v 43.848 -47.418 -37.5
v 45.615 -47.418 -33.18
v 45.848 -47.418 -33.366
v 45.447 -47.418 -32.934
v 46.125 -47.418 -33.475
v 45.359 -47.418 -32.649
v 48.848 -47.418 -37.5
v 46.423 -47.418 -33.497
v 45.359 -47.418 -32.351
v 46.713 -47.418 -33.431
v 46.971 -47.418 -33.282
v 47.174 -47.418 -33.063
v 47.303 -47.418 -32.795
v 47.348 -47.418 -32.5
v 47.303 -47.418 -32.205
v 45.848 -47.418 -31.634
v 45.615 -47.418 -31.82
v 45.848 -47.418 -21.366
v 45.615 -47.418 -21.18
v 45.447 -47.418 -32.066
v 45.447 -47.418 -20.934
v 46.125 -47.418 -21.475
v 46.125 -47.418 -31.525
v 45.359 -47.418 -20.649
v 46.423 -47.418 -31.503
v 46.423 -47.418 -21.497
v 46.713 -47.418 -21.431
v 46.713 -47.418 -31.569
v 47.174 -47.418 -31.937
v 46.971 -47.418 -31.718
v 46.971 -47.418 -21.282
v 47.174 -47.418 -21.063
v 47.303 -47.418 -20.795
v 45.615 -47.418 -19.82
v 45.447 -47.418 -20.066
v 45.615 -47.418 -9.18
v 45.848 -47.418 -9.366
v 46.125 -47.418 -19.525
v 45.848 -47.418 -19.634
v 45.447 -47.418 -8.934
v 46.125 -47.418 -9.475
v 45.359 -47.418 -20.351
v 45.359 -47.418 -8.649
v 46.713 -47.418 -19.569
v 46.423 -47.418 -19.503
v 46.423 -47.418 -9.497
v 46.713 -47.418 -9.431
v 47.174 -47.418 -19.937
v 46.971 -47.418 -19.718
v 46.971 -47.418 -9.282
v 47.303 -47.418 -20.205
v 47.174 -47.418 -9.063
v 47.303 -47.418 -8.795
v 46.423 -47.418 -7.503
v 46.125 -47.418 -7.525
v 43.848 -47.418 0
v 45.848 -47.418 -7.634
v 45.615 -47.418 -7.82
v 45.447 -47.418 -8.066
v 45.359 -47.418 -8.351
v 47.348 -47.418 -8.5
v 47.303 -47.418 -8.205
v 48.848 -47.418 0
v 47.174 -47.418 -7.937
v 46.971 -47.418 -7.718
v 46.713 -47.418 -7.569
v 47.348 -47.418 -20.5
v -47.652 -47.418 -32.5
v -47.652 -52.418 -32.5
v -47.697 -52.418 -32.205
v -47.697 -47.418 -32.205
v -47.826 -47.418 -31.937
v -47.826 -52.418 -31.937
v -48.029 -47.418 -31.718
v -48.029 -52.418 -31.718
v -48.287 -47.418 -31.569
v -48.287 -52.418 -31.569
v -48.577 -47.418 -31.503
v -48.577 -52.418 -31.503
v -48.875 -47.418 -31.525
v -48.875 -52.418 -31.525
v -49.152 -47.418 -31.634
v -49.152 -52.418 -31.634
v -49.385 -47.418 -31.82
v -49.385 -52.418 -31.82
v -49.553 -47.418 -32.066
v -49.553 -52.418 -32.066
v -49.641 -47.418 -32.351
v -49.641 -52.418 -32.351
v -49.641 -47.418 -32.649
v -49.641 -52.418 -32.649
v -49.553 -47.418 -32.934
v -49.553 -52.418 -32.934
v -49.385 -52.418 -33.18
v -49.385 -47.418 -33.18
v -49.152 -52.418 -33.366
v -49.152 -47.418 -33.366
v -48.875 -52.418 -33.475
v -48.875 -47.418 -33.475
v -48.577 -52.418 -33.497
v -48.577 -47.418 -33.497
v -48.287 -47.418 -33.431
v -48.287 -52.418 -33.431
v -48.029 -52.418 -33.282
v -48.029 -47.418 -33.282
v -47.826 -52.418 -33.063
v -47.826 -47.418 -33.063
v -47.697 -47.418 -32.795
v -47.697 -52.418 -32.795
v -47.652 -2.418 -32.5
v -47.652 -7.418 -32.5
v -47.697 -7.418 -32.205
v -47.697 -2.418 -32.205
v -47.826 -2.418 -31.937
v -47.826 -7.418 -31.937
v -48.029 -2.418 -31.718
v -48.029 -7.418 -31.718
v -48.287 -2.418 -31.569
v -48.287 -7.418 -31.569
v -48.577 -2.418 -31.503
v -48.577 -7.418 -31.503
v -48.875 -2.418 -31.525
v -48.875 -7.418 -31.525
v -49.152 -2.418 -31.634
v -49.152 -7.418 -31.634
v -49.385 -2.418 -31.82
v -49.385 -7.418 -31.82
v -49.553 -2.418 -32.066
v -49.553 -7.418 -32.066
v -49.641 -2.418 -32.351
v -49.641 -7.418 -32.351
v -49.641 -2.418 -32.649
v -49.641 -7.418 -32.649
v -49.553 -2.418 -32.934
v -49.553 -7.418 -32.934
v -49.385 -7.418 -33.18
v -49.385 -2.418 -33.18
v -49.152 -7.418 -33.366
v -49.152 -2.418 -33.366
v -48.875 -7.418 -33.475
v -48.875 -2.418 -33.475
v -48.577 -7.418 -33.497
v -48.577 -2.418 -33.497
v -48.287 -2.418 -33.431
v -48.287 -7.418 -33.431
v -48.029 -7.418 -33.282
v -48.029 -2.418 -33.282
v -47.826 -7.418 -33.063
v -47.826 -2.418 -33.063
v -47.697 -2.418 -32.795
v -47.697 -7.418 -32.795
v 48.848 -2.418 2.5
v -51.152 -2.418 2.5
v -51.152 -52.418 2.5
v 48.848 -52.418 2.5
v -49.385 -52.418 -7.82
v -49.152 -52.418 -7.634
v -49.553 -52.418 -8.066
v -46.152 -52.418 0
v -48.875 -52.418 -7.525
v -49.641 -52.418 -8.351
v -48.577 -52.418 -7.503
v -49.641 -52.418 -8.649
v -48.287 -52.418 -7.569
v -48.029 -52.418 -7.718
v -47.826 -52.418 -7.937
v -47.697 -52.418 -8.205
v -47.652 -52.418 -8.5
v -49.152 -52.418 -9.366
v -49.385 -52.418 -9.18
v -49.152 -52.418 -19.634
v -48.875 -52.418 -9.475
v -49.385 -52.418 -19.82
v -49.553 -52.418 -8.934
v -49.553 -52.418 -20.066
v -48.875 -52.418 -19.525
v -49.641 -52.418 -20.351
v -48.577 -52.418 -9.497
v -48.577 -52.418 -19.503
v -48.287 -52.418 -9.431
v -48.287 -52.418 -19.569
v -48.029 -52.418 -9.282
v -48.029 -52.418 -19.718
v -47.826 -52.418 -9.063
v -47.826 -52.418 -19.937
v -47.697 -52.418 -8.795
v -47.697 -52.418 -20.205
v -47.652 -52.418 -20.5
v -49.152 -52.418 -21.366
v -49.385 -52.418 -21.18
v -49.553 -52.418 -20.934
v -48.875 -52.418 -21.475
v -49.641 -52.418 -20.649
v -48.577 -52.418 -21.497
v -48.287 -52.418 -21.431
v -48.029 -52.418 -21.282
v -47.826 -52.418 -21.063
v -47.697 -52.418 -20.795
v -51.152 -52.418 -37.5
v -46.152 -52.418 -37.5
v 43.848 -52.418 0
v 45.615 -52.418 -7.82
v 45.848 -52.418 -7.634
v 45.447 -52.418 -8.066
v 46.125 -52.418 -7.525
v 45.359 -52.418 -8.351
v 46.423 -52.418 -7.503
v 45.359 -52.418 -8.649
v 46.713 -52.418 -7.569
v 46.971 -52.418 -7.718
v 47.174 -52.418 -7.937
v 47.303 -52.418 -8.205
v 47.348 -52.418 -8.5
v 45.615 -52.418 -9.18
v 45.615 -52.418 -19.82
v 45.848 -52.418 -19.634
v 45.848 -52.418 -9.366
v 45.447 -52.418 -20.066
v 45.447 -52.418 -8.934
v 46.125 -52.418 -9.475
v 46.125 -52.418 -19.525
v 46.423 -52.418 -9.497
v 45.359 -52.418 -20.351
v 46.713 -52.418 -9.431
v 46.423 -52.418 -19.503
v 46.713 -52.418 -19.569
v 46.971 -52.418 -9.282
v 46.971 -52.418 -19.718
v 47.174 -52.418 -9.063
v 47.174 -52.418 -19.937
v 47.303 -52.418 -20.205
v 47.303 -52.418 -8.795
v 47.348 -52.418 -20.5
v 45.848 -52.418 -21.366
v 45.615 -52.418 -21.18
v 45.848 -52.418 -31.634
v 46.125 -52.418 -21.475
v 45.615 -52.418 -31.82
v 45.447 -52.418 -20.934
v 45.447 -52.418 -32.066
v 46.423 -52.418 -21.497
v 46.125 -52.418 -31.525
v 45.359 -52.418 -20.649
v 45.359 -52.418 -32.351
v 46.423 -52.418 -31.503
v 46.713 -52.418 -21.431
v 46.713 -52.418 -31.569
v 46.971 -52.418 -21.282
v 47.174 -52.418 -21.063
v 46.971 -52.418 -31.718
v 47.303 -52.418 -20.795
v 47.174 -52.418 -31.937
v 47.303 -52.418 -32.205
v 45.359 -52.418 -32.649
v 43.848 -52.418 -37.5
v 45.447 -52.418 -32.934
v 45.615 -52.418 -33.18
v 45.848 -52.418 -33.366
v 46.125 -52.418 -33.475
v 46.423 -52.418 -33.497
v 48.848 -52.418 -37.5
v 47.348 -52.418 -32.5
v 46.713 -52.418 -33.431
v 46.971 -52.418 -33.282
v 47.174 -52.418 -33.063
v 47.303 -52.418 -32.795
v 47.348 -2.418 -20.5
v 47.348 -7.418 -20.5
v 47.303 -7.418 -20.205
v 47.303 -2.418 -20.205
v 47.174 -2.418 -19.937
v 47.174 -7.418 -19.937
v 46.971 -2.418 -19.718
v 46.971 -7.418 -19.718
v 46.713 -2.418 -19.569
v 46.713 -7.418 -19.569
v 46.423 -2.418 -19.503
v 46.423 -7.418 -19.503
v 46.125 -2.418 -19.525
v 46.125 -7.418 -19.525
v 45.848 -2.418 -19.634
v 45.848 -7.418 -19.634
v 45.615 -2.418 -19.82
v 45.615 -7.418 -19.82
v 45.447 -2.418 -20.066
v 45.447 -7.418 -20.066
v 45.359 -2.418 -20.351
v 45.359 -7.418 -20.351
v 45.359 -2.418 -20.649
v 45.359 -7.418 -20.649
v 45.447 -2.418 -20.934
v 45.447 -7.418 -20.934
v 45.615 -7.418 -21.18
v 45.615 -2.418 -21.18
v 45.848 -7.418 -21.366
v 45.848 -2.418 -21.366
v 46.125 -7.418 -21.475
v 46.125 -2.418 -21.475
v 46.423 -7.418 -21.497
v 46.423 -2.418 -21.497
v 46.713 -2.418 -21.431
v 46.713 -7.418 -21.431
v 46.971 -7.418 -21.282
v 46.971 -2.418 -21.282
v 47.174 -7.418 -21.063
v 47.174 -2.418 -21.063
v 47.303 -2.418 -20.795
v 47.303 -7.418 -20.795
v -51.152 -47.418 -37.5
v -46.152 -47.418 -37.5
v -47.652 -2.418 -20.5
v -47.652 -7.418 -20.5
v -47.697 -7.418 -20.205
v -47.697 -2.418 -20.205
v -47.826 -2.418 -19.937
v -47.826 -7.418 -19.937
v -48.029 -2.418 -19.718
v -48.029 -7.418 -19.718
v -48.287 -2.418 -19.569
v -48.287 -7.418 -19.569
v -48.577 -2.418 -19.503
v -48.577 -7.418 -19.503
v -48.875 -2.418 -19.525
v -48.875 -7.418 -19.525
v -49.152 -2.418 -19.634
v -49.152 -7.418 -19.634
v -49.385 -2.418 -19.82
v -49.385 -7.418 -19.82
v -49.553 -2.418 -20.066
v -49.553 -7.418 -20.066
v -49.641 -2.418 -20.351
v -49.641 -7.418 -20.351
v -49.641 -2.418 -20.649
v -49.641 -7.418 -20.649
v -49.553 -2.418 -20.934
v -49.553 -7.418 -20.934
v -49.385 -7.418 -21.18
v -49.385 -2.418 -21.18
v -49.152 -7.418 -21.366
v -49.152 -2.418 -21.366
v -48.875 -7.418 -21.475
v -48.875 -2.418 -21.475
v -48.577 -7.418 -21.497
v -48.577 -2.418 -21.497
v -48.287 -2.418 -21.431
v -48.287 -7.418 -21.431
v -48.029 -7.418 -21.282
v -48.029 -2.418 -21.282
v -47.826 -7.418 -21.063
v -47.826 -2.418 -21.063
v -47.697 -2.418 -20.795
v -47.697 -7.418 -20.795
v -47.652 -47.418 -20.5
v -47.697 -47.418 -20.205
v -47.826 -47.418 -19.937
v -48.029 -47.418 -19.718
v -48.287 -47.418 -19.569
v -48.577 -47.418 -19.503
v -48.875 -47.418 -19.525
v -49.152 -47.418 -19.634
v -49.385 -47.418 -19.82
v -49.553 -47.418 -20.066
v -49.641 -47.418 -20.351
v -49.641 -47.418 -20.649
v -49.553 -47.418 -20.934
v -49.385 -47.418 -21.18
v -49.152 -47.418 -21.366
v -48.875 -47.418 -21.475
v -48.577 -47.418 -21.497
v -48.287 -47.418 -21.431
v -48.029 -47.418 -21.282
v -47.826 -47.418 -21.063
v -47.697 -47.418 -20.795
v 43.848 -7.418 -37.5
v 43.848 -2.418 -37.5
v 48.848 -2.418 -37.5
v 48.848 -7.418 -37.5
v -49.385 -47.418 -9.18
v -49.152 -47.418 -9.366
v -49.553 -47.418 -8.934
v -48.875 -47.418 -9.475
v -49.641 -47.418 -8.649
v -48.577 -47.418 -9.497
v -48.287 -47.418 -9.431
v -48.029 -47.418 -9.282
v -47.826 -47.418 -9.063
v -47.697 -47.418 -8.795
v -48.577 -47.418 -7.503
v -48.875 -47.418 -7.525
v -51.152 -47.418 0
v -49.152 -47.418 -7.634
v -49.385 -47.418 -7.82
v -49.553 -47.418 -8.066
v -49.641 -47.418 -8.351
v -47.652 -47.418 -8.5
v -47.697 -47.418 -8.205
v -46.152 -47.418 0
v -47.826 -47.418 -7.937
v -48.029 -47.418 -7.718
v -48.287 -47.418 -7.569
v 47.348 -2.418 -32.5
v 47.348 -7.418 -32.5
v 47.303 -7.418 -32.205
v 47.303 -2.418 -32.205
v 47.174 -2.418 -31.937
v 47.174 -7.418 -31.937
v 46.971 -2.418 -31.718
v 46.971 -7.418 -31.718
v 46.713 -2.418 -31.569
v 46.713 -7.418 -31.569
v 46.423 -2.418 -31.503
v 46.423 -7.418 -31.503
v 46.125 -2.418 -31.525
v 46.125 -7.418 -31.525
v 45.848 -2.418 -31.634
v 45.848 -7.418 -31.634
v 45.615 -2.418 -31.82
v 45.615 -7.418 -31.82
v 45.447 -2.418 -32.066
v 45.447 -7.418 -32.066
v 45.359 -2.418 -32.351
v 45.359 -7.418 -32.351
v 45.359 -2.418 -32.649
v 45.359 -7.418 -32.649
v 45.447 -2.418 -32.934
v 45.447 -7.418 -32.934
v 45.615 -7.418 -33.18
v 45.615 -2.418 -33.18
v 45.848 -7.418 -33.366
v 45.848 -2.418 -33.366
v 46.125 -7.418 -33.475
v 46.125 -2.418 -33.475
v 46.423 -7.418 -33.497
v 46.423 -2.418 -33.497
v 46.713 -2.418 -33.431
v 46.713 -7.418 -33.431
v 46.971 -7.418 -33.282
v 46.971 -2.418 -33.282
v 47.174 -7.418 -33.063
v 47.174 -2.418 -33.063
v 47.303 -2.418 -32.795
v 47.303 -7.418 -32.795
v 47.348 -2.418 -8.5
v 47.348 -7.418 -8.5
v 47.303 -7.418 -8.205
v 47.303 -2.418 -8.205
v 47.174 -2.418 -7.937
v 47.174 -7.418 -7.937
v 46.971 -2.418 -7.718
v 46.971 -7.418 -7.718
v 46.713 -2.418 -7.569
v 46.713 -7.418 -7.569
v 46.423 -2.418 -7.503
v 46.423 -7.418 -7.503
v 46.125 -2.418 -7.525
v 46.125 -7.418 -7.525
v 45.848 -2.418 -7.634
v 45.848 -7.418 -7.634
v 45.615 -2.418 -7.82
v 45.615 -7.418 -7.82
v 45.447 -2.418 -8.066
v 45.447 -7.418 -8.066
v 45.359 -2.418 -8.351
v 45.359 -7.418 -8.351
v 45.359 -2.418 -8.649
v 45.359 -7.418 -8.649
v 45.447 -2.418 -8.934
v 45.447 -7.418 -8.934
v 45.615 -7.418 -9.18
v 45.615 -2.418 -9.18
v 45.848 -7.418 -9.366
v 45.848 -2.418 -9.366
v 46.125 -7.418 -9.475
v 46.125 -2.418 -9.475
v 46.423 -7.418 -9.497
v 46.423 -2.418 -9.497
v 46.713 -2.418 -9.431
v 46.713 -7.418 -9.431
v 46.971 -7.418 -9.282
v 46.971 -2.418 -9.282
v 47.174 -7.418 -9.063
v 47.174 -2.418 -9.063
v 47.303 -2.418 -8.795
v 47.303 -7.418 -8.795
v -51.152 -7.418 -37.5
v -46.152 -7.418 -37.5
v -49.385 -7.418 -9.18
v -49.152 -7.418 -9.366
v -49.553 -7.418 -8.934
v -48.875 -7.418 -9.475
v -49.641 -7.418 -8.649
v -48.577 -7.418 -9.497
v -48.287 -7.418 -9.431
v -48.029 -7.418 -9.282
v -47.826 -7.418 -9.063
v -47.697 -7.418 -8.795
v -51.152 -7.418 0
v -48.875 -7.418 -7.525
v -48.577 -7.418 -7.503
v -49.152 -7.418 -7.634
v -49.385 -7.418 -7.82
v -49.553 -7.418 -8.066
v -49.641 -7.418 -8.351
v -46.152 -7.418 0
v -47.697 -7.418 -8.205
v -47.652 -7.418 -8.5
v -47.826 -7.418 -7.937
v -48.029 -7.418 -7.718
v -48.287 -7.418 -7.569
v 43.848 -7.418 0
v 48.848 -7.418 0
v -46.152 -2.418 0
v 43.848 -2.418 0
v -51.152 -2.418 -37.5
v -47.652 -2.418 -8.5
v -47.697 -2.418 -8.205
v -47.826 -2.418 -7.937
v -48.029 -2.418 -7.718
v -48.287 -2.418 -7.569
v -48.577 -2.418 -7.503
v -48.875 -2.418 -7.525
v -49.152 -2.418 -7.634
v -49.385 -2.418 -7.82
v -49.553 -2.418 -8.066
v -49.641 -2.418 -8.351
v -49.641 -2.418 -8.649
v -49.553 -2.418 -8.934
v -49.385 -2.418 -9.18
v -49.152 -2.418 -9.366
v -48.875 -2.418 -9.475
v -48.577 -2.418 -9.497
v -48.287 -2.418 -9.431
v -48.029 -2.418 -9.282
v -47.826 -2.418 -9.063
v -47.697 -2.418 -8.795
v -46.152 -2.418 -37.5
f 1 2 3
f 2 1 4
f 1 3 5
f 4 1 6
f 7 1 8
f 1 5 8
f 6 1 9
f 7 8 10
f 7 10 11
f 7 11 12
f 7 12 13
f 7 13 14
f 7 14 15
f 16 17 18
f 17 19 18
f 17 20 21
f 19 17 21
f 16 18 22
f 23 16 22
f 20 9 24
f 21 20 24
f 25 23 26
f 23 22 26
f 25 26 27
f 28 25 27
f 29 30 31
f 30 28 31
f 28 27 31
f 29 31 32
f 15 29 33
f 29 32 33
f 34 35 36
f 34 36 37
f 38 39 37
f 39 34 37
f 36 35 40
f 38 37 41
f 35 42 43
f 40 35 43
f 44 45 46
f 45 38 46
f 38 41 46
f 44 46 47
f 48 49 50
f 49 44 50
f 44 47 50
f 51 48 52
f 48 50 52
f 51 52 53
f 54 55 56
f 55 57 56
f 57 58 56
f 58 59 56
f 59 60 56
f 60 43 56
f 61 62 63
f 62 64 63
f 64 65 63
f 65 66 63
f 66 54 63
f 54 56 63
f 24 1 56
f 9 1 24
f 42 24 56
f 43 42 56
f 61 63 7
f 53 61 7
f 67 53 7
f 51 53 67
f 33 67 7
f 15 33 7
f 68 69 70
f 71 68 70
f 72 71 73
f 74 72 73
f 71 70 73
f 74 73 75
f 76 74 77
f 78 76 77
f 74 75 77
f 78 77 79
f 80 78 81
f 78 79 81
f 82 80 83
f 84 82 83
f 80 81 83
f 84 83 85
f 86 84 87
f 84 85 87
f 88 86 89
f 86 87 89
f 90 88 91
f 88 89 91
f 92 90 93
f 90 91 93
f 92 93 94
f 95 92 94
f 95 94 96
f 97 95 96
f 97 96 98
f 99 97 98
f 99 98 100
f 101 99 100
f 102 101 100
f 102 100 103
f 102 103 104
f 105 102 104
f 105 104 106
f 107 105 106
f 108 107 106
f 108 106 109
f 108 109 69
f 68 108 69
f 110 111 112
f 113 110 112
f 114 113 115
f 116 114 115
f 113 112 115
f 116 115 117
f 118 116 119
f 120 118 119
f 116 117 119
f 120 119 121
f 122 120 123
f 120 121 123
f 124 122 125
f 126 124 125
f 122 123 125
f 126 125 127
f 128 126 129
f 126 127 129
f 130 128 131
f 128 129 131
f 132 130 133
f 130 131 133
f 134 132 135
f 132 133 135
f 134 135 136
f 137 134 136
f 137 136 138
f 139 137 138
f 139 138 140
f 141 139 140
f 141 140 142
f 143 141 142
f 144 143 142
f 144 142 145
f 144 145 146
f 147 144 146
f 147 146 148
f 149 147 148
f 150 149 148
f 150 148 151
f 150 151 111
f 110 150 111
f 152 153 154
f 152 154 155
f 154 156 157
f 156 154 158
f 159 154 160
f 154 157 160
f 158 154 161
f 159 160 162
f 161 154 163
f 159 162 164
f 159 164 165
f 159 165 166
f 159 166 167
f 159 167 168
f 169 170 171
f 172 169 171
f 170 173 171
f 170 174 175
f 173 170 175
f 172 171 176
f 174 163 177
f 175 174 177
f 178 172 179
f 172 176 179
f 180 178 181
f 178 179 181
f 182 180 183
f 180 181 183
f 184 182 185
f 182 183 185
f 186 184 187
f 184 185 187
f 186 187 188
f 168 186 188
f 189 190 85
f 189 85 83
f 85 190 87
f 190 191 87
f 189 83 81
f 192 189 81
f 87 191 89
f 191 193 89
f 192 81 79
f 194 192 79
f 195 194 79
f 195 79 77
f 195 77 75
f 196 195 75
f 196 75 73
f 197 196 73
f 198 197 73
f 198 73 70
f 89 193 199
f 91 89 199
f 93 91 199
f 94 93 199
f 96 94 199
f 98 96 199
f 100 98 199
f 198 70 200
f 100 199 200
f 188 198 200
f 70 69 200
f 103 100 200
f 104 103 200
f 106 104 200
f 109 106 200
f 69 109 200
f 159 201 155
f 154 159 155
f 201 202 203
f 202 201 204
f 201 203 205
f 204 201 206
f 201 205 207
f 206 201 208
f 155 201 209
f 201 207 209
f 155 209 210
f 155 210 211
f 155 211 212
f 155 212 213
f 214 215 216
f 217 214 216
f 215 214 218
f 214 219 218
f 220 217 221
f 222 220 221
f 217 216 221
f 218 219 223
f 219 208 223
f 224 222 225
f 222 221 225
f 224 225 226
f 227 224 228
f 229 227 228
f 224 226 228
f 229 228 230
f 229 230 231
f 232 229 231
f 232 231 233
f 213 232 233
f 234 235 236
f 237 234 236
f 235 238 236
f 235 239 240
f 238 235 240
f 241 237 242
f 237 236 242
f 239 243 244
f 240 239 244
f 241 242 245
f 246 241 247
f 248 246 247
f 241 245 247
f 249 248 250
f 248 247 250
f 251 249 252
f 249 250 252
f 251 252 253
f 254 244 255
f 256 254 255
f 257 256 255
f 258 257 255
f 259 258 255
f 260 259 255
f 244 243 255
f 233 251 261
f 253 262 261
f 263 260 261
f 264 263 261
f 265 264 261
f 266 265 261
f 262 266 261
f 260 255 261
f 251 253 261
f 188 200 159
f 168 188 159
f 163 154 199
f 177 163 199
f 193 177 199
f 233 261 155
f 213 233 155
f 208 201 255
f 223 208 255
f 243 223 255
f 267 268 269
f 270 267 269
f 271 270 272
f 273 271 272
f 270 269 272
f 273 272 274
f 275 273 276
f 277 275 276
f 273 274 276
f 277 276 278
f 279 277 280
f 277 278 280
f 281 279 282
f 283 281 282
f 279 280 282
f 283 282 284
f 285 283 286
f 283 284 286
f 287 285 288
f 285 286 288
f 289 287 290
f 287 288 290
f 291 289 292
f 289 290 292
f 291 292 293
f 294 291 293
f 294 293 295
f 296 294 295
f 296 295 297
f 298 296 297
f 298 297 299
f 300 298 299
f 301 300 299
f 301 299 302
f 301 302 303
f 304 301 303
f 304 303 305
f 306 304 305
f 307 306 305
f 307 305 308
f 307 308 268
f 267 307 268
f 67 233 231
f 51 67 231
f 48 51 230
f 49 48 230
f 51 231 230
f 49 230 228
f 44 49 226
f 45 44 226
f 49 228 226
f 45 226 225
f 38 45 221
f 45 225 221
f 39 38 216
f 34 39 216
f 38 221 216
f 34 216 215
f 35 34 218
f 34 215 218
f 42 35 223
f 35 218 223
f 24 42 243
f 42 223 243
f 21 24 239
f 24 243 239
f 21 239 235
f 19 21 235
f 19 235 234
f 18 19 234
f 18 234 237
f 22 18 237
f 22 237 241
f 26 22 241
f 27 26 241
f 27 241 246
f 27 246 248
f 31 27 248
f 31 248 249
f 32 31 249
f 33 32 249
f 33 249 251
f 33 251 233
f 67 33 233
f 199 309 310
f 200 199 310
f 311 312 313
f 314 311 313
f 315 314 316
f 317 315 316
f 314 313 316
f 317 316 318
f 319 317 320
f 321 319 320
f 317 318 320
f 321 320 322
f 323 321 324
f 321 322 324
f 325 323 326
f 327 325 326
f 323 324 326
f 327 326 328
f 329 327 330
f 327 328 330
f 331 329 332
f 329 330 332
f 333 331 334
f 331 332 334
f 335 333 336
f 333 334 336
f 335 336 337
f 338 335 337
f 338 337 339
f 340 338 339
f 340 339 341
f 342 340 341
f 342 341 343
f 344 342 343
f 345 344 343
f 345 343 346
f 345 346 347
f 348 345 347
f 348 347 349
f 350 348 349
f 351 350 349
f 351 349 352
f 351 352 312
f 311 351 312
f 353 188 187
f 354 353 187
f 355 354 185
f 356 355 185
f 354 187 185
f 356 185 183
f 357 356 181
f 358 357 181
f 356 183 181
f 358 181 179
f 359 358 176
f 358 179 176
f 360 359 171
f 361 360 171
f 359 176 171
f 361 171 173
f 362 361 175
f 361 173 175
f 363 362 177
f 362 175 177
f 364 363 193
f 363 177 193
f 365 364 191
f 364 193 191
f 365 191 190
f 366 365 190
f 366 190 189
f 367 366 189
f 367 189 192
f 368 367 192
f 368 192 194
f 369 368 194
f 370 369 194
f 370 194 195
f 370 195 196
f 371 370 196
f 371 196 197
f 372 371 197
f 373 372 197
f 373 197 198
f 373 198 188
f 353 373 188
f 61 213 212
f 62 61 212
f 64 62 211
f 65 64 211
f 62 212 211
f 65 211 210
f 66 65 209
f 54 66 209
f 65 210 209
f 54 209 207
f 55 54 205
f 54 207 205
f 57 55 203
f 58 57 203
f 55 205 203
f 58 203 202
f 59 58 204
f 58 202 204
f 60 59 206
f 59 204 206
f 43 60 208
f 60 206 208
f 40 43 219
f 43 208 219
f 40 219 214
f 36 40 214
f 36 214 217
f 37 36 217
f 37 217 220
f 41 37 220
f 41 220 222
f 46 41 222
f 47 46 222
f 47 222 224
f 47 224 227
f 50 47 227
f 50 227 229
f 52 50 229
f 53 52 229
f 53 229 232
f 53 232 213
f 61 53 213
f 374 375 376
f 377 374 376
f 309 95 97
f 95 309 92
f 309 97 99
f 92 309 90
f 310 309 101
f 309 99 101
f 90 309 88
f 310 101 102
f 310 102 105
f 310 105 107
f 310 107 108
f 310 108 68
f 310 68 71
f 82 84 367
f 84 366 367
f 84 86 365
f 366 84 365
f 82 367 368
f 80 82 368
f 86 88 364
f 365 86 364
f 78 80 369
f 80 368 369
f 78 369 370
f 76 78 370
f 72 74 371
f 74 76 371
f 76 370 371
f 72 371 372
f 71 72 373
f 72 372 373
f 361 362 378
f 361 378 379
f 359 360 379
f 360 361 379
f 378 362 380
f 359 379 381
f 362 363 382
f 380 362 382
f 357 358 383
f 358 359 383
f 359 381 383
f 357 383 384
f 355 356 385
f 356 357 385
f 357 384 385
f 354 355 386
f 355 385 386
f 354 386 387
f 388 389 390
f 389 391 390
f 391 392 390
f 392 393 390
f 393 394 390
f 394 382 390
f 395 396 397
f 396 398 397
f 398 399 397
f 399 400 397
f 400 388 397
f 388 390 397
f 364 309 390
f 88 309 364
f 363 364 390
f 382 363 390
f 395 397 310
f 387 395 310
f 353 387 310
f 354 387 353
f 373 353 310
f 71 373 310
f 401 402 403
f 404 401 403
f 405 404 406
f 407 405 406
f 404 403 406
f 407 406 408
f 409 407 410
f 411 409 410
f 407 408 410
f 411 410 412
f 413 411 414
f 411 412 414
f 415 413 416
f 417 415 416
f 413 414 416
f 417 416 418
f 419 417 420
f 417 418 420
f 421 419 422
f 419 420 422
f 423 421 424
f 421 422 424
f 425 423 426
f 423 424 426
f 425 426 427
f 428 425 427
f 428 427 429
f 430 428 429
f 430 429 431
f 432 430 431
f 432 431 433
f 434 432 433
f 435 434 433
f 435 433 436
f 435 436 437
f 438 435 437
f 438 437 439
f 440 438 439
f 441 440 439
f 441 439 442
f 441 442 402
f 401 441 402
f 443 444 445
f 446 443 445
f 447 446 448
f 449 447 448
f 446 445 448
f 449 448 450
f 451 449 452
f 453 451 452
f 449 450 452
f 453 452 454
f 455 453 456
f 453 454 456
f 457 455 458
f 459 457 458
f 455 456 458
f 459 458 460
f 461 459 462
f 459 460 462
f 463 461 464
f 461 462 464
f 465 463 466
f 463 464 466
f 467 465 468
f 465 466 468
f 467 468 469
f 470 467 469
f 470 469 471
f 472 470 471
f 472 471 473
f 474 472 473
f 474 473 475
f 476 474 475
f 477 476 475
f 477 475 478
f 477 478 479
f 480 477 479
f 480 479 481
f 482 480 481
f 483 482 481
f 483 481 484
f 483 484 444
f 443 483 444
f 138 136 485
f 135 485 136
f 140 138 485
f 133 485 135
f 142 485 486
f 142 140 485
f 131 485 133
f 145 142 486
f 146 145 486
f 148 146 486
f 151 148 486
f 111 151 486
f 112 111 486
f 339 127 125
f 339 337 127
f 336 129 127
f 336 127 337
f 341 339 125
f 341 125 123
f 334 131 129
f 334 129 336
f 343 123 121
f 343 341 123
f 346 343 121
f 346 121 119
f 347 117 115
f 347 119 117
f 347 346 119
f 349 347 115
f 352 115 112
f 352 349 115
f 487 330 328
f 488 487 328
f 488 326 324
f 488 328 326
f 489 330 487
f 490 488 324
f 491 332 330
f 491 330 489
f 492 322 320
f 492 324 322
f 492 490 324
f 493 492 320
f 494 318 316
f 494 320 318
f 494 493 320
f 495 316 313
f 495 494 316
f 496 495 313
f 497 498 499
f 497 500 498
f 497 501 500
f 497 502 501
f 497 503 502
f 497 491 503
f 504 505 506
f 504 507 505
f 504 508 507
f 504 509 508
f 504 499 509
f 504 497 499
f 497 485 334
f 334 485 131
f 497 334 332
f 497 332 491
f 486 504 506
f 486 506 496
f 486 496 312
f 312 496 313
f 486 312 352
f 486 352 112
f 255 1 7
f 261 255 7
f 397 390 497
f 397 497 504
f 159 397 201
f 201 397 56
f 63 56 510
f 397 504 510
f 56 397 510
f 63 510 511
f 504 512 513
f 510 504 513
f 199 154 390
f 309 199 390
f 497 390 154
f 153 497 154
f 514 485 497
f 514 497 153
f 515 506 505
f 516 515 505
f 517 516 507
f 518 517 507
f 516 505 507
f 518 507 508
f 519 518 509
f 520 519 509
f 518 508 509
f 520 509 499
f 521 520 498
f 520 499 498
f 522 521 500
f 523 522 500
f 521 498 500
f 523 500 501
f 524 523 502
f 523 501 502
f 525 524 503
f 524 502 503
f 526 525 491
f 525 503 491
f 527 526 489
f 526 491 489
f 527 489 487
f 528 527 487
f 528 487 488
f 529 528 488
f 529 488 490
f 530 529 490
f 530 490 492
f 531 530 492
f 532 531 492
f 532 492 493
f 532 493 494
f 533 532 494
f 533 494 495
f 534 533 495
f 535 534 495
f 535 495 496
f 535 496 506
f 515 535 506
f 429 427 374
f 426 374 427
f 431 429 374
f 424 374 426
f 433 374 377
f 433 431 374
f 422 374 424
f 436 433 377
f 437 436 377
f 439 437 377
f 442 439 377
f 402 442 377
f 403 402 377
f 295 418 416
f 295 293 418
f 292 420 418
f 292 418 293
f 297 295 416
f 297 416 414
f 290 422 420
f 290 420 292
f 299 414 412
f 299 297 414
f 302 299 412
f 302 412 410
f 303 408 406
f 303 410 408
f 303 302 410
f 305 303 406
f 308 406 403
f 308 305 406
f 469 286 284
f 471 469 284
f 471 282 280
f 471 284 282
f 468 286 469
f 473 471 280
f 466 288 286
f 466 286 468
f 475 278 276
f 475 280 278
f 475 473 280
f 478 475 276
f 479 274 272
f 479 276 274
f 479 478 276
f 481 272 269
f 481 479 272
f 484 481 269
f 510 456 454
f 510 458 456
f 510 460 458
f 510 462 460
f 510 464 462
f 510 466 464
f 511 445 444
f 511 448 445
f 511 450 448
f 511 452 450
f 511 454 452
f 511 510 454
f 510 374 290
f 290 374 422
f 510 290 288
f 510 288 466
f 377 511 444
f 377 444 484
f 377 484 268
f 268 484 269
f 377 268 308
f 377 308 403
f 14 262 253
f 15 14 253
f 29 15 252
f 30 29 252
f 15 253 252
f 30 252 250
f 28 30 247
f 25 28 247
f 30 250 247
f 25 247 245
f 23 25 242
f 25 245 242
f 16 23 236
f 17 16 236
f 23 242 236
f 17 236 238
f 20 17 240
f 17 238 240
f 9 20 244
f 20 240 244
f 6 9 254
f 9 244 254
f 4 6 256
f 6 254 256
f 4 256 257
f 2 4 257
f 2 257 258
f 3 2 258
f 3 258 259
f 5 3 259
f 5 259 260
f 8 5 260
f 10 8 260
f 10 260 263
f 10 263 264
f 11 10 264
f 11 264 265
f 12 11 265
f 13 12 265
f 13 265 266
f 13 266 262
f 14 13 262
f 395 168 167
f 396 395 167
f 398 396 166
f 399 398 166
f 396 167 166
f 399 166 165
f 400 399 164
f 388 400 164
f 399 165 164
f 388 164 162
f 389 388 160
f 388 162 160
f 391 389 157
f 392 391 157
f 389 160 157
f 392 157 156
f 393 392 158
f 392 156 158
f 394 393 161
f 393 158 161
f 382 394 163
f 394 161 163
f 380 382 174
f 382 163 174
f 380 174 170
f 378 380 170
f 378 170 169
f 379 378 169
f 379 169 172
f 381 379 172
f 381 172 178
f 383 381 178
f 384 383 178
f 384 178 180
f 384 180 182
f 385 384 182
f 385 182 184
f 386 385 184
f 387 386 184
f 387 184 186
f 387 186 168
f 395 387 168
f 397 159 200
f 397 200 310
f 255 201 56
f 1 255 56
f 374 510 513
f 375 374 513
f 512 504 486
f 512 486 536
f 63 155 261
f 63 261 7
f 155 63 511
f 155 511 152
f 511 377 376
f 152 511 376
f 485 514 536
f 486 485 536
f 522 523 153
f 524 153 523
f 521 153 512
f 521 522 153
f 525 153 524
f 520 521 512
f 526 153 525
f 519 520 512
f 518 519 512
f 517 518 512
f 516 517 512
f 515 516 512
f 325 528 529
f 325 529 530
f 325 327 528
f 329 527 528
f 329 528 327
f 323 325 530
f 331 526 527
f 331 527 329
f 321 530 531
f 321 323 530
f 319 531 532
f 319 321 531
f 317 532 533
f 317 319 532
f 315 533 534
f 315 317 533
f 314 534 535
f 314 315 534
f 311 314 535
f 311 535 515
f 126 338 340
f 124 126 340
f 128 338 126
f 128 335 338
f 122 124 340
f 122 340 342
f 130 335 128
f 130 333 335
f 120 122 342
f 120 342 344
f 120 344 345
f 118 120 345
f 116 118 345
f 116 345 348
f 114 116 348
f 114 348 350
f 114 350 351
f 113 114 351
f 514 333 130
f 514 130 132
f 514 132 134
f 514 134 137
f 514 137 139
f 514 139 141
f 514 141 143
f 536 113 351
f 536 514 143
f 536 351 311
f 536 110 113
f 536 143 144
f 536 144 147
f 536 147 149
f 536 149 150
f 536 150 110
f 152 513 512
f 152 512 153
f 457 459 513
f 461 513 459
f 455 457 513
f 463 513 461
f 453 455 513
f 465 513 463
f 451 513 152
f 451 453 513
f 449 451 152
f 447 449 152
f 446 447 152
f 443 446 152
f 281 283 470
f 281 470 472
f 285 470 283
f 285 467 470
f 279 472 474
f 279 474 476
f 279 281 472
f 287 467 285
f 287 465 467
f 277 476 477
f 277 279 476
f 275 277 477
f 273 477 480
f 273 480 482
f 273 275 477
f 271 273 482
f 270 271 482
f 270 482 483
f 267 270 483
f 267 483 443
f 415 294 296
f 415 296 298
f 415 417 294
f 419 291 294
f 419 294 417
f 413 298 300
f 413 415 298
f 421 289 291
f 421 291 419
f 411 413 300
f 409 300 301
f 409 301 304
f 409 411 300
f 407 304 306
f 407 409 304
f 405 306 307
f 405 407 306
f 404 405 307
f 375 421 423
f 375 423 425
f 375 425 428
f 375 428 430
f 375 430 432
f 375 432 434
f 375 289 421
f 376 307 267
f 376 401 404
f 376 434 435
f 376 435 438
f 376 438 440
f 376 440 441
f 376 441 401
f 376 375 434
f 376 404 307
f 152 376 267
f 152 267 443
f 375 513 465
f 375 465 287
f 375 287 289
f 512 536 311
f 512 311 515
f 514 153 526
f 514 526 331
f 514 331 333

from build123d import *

# Parameters (mm, degrees)
F0_W     = 100
F0_H     = 50
F1_DEPTH = 2.5
F2_W     = 5
F2_H     = 5
F3_DEPTH = 40
F4_R     = 1
F5_DEPTH = 50.001


with BuildPart() as f1:
    # F0 (on Top) → F1 (new body)
    with BuildSketch(Plane.XY):
        with Locations((-1.152176, -27.418026)):
            Rectangle(F0_W, F0_H)
    extrude(amount=F1_DEPTH)

    # F2 (on face) → F3 (join)
    with BuildSketch(Plane.XY.offset(2.5)):
        with Locations((-48.652176, -4.918026)):
            Rectangle(F2_W, F2_H)
        with Locations((46.347824, -4.918026)):
            Rectangle(F2_W, F2_H)
        with Locations((46.347824, -49.918026)):
            Rectangle(F2_W, F2_H)
        with Locations((-48.652176, -49.918026)):
            Rectangle(F2_W, F2_H)
    extrude(amount=-F3_DEPTH)

    # F4 (on face) → F5 (cut, through all)
    with BuildSketch(Plane.XZ.offset(52.418026)):
        with Locations((46.347824, -32.5)):
            Circle(F4_R)
        with Locations((46.347824, -20.5)):
            Circle(F4_R)
        with Locations((46.347824, -8.5)):
            Circle(F4_R)
        with Locations((-48.652176, -8.5)):
            Circle(F4_R)
        with Locations((-48.652176, -20.5)):
            Circle(F4_R)
        with Locations((-48.652176, -32.5)):
            Circle(F4_R)
    extrude(amount=-F5_DEPTH, mode=Mode.SUBTRACT)


solid = f1.part
